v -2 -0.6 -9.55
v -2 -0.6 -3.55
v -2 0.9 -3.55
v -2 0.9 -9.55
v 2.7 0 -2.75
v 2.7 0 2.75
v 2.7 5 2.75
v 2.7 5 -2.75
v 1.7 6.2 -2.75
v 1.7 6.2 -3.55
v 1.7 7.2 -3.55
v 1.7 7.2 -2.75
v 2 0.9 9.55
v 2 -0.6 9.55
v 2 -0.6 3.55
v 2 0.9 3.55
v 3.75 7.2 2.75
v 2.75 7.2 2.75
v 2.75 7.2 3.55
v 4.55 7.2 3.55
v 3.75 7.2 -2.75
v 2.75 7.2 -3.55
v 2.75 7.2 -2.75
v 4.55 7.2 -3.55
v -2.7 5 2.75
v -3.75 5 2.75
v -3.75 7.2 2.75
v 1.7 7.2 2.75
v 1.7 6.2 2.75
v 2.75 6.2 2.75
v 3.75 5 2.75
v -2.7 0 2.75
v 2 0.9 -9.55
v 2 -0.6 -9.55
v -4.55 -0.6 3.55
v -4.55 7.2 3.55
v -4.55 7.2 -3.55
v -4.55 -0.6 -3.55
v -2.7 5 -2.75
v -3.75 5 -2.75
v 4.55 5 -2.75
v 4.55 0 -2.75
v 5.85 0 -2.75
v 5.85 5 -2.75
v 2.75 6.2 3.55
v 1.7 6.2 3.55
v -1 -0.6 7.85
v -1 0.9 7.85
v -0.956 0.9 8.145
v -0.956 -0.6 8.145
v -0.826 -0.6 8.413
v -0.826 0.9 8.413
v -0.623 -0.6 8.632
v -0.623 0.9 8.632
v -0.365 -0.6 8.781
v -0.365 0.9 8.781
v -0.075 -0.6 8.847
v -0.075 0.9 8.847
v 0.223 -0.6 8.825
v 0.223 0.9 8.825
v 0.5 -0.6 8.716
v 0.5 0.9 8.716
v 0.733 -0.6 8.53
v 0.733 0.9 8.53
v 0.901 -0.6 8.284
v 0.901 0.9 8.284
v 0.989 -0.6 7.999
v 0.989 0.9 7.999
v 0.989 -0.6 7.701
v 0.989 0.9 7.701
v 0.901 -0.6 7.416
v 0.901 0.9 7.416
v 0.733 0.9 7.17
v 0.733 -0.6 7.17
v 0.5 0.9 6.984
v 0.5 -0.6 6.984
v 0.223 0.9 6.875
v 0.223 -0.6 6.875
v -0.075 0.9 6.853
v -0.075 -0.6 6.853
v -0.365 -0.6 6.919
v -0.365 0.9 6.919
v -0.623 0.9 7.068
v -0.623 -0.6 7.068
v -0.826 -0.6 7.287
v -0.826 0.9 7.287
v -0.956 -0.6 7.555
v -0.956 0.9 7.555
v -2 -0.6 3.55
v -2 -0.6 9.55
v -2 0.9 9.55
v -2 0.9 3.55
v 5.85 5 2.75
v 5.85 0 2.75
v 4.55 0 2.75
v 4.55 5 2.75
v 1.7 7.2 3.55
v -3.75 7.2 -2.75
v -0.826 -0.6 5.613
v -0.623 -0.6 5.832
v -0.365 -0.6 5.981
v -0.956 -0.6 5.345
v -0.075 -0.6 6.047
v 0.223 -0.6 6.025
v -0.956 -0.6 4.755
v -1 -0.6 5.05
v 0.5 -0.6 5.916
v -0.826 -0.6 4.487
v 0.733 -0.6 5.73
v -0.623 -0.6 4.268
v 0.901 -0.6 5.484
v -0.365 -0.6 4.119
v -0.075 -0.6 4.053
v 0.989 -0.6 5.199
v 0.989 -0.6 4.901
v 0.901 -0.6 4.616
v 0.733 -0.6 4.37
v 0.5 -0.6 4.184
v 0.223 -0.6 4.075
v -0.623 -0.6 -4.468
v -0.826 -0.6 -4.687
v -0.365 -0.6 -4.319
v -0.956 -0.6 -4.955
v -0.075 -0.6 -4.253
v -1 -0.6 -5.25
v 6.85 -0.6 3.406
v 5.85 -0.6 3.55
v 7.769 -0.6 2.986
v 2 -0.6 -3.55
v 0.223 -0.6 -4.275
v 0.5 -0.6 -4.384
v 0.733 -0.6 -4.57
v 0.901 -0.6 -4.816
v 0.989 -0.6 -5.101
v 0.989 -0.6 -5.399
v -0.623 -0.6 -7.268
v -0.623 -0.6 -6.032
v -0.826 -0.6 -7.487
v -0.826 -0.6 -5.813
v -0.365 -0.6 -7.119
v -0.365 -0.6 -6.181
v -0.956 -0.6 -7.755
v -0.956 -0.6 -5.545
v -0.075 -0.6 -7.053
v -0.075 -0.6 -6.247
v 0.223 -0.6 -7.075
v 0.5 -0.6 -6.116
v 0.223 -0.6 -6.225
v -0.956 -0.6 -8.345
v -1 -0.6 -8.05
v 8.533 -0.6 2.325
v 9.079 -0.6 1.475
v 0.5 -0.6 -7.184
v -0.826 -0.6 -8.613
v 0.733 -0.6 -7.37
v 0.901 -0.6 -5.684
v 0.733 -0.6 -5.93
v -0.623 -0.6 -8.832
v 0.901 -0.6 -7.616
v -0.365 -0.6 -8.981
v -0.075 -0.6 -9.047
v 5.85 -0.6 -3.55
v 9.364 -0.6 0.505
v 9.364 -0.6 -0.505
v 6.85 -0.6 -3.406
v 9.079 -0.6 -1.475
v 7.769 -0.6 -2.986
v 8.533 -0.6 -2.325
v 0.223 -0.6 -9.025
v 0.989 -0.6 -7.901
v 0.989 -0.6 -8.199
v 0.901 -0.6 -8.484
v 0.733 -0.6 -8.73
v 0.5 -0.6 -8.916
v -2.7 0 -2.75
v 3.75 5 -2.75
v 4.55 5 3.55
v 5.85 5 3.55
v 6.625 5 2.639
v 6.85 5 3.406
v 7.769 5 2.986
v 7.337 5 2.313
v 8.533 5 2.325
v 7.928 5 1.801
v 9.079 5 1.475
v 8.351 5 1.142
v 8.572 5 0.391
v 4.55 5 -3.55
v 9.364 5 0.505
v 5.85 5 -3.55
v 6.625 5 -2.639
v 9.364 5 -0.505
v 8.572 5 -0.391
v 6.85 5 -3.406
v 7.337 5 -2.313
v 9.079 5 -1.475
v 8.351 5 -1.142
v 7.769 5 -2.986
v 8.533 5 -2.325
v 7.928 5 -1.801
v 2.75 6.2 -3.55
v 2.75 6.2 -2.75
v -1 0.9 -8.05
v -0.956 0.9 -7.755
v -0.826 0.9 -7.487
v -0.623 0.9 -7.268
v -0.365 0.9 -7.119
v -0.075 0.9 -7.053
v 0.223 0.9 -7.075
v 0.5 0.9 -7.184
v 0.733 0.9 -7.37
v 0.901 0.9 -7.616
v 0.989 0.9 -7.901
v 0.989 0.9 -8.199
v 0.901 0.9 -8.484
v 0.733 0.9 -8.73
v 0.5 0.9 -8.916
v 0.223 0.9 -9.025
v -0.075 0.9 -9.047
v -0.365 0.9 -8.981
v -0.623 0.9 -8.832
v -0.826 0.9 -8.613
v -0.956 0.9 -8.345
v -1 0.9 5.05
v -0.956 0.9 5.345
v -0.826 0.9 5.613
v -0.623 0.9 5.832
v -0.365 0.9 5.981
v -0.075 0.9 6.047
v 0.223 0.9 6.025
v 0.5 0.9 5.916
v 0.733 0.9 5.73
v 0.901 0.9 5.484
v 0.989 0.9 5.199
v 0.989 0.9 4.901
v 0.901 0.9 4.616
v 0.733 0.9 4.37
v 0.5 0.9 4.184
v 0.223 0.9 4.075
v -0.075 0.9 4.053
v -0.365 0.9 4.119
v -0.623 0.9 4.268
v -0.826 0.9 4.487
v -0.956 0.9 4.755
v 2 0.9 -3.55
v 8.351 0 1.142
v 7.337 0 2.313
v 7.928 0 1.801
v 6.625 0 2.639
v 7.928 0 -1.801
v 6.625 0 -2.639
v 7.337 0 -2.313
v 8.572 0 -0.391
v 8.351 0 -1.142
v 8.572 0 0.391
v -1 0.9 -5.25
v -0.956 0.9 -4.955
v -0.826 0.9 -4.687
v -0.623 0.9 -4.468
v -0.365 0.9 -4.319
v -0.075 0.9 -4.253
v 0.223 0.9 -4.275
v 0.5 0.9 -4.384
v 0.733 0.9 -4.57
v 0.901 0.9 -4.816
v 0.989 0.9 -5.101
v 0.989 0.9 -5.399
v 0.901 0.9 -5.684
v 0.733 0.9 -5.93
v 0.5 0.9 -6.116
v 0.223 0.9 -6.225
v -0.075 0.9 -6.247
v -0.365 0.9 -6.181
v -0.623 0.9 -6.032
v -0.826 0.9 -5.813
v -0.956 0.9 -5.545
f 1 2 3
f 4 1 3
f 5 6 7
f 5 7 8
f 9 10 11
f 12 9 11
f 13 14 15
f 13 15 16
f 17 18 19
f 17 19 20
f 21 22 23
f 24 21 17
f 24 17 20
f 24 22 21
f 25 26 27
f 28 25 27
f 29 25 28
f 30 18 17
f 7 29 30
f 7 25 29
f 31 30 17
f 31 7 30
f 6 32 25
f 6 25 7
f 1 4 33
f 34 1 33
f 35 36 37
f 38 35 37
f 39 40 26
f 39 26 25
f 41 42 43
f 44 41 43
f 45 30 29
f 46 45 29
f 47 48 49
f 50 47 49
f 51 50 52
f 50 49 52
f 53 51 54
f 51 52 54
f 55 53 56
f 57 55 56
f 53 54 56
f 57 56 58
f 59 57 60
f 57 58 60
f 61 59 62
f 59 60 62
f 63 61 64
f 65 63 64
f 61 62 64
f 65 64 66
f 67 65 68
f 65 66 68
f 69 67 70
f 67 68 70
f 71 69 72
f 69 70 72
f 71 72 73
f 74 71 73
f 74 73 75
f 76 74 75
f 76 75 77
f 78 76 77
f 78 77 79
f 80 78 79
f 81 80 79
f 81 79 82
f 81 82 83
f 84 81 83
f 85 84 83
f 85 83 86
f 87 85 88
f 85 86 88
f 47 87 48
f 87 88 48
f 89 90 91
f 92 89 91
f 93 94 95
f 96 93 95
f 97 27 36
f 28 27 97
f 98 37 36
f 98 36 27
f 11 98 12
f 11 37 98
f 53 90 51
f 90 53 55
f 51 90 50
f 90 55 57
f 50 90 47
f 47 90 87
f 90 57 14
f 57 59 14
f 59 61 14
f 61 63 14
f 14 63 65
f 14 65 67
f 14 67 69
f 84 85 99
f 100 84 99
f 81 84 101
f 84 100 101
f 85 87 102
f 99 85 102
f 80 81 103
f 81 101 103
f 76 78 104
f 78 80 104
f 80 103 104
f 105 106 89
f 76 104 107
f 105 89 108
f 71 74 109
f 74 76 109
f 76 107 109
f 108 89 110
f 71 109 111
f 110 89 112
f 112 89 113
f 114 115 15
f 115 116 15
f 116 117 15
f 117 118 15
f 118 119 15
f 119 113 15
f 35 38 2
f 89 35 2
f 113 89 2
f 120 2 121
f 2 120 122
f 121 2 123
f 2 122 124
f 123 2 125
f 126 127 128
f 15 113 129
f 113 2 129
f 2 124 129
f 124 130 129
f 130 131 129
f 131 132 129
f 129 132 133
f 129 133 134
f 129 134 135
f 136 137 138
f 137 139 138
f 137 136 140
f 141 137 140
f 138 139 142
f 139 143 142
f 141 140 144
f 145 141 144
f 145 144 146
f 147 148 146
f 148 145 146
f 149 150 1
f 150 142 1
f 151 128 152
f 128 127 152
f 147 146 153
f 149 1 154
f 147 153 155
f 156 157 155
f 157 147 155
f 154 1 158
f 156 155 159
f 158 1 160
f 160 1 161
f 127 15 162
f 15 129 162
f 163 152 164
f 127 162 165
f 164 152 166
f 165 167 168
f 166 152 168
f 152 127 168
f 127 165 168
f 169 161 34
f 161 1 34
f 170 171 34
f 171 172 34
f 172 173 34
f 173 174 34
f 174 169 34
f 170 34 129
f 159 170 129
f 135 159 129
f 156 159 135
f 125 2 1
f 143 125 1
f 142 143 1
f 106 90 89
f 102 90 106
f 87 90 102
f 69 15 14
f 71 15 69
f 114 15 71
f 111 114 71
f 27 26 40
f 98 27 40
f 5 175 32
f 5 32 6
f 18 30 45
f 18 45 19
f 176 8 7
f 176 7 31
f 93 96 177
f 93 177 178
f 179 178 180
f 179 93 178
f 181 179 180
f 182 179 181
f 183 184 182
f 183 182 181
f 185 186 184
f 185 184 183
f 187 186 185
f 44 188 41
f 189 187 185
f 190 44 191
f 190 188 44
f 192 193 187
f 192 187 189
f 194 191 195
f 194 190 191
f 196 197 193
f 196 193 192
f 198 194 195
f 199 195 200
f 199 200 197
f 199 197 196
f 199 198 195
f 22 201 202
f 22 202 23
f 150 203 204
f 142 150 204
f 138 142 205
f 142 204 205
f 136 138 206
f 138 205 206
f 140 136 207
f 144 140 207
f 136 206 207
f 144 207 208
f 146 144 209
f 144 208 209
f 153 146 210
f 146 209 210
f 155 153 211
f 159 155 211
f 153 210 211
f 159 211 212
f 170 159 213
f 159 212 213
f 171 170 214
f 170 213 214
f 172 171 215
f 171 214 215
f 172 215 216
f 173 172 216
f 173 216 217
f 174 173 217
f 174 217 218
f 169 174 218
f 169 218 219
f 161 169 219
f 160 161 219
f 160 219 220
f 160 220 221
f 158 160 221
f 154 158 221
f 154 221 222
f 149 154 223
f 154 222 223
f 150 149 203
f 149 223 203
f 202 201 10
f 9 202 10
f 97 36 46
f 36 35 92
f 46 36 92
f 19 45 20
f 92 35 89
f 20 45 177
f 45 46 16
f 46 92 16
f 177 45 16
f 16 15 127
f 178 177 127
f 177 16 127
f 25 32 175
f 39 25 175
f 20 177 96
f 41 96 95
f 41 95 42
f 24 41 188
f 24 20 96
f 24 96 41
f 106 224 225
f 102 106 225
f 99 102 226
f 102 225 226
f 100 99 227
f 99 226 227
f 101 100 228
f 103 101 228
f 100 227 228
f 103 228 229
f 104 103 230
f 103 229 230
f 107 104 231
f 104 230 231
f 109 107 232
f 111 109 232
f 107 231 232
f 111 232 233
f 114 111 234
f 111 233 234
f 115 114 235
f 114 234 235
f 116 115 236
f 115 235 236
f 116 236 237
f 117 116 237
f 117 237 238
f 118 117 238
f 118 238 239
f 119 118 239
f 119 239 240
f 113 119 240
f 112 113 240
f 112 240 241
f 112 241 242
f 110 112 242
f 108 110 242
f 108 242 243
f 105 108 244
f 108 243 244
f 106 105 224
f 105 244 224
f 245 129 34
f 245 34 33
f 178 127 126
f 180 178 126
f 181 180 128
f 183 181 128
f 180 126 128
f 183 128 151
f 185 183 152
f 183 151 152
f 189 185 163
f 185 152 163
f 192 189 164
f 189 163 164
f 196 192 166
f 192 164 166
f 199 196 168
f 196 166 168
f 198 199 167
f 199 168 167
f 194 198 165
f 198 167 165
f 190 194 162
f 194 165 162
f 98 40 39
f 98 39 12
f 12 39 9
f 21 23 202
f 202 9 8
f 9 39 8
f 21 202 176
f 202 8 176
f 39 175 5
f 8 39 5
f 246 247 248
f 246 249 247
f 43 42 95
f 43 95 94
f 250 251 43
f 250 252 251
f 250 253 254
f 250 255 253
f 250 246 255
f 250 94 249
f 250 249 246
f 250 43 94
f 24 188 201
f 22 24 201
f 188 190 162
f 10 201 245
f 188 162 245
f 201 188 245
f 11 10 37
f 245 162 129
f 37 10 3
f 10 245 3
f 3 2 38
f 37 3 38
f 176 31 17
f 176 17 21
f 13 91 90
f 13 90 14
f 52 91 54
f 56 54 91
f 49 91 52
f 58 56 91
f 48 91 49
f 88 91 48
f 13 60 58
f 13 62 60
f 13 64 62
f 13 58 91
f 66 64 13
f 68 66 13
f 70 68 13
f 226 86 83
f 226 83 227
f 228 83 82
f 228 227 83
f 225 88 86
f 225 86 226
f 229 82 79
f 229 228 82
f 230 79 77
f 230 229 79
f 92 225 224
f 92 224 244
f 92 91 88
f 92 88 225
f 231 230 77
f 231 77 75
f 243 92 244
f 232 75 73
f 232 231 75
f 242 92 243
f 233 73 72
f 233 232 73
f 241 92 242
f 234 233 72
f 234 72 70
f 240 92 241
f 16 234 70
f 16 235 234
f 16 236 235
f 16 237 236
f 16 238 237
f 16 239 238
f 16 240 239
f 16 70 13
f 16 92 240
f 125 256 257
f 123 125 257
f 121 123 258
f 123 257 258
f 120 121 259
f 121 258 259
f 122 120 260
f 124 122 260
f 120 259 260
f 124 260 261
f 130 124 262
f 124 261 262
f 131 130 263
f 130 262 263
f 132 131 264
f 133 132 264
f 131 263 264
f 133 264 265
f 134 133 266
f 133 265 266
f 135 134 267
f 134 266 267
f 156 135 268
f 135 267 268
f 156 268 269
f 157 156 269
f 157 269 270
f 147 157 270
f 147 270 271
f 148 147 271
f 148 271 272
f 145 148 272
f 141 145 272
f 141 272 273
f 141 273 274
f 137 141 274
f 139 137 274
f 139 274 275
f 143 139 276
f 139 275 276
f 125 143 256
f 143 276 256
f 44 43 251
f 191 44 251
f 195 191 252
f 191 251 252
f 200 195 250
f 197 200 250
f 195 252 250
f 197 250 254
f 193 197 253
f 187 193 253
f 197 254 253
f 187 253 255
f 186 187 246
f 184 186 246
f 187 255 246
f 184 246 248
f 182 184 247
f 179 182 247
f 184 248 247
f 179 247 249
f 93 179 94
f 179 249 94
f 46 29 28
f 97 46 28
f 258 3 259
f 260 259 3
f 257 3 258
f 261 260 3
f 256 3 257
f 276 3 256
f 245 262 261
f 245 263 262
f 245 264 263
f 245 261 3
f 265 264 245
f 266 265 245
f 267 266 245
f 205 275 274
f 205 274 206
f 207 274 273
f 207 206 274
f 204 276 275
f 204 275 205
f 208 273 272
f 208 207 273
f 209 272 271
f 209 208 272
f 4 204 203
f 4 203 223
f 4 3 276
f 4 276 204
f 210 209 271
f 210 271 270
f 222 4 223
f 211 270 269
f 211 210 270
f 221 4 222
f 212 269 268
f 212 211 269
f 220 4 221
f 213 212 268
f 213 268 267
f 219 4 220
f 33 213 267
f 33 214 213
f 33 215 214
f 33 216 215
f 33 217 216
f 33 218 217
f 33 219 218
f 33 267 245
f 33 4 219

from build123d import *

# Parameters (mm, degrees)
EXTRUDE_1_DEPTH        = 7.2
SKETCH_1_3_W           = 1.05
SKETCH_1_3_H           = 5.5
EXTRUDE_2_DEPTH        = 5
SKETCH_1_4_W           = 9.1
SKETCH_1_4_H           = 7.1
EXTRUDE_3_DEPTH        = 0.6
EXTRUDE_4_DEPTH        = 5
EXTRUDE_START          = -0.6
EXTRUDE_5_DEPTH        = 0.6
SKETCH_2_W             = 1.05
SKETCH_2_H             = 1
CUT_EXTRUDE_1_DEPTH    = 7.1
SKETCH_4_W             = 4
SKETCH_4_H             = 1.5
EXTRUDE_7_DEPTH        = 6
SKETCH_5_R             = 1
CUT_EXTRUDE_2_DEPTH    = 1.5
PATTERN_LINEAR_2_COUNT = 2
PATTERN_LINEAR_2_PITCH = 13.1


with BuildPart() as part:
    # Эскиз1 → Бобышка-Вытянуть1 (new body)
    with BuildSketch(Plane(origin=(0, 0, 0), x_dir=(1, 0, 0), z_dir=(0, 1, 0))):
        Polygon((4.55, -2.75), (4.55, 2.75), (4.55, 3.55), (-4.55, 3.55), (-4.55, -3.55), (4.55, -3.55), align=None)
        Polygon((-2.7, -2.75), (-3.75, -2.75), (-3.75, 2.75), (-2.7, 2.75), (2.7, 2.75), (3.75, 2.75), (3.75, -2.75), (2.7, -2.75), align=None, mode=Mode.SUBTRACT)
    extrude(amount=EXTRUDE_1_DEPTH)

    # Эскиз1<3> → Бобышка-Вытянуть2 (add)
    with BuildSketch(Plane(origin=(0, 0, 0), x_dir=(1, 0, 0), z_dir=(0, 1, 0))):
        with Locations((-3.225, 0)):
            Rectangle(SKETCH_1_3_W, SKETCH_1_3_H)
        with Locations((3.225, 0)):
            Rectangle(SKETCH_1_3_W, SKETCH_1_3_H)
    extrude(amount=EXTRUDE_2_DEPTH)

    # Эскиз1<4> → Бобышка-Вытянуть3 (add)
    with BuildSketch(Plane(origin=(0, 0, 0), x_dir=(1, 0, 0), z_dir=(0, 1, 0))):
        Rectangle(SKETCH_1_4_W, SKETCH_1_4_H)
    extrude(amount=-EXTRUDE_3_DEPTH)

    # Эскиз1<5> → Бобышка-Вытянуть4 (add)
    with BuildSketch(Plane(origin=(0, 0, 0), x_dir=(1, 0, 0), z_dir=(0, 1, 0))):
        with BuildLine():
            Line((4.55, 3.55), (4.55, 2.75))
            Line((4.55, 2.75), (5.85, 2.75))
            ThreePointArc((5.85, 2.75), (8.6, 0), (5.85, -2.75))
            Line((5.85, -2.75), (4.55, -2.75))
            Line((4.55, -2.75), (4.55, -3.55))
            Line((4.55, -3.55), (5.85, -3.55))
            ThreePointArc((5.85, -3.55), (9.4, 0), (5.85, 3.55))
            Line((5.85, 3.55), (4.55, 3.55))
        make_face()
    extrude(amount=EXTRUDE_4_DEPTH)

    # Эскиз1<6> → Бобышка-Вытянуть5 (add)
    with BuildSketch(Plane(origin=(0, 0, 0), x_dir=(1, 0, 0), z_dir=(0, 1, 0)).offset(EXTRUDE_START)):
        with BuildLine():
            Line((4.55, 3.55), (4.55, -3.55))
            Line((4.55, -3.55), (5.85, -3.55))
            ThreePointArc((5.85, -3.55), (9.4, 0), (5.85, 3.55))
            Line((5.85, 3.55), (4.55, 3.55))
        make_face()
    extrude(amount=EXTRUDE_5_DEPTH)

    # Эскиз2 → Вырез-Вытянуть1 (cut)
    with BuildSketch(Plane(origin=(0, 0, -3.55), x_dir=(-1, 0, 0), z_dir=(0, 0, -1))):
        with Locations((-2.225, 6.7)):
            Rectangle(SKETCH_2_W, SKETCH_2_H)
    extrude(amount=-CUT_EXTRUDE_1_DEPTH, mode=Mode.SUBTRACT)

    # Эскиз4 → Бобышка-Вытянуть7 (add)
    with BuildSketch(Plane.XY.offset(3.55)):
        with Locations((0, 0.15)):
            Rectangle(SKETCH_4_W, SKETCH_4_H)
    extrude_7 = extrude(amount=EXTRUDE_7_DEPTH)

    # Эскиз5 → Вырез-Вытянуть2 (cut)
    with BuildSketch(Plane(origin=(0, 0.9, 0), x_dir=(1, 0, 0), z_dir=(0, 1, 0))):
        with Locations((0, -5.05)):
            Circle(SKETCH_5_R)
        with Locations((0, -7.85)):
            Circle(SKETCH_5_R)
    cut_extrude_2 = extrude(amount=-CUT_EXTRUDE_2_DEPTH, mode=Mode.SUBTRACT)

    # Линейный массив2: Бобышка-Вытянуть7, Вырез-Вытянуть2 ×2
    with Locations(*[(0, 0, -i * PATTERN_LINEAR_2_PITCH) for i in range(1, PATTERN_LINEAR_2_COUNT)]):
        add(extrude_7)
        add(cut_extrude_2, mode=Mode.SUBTRACT)


solid = part.part
